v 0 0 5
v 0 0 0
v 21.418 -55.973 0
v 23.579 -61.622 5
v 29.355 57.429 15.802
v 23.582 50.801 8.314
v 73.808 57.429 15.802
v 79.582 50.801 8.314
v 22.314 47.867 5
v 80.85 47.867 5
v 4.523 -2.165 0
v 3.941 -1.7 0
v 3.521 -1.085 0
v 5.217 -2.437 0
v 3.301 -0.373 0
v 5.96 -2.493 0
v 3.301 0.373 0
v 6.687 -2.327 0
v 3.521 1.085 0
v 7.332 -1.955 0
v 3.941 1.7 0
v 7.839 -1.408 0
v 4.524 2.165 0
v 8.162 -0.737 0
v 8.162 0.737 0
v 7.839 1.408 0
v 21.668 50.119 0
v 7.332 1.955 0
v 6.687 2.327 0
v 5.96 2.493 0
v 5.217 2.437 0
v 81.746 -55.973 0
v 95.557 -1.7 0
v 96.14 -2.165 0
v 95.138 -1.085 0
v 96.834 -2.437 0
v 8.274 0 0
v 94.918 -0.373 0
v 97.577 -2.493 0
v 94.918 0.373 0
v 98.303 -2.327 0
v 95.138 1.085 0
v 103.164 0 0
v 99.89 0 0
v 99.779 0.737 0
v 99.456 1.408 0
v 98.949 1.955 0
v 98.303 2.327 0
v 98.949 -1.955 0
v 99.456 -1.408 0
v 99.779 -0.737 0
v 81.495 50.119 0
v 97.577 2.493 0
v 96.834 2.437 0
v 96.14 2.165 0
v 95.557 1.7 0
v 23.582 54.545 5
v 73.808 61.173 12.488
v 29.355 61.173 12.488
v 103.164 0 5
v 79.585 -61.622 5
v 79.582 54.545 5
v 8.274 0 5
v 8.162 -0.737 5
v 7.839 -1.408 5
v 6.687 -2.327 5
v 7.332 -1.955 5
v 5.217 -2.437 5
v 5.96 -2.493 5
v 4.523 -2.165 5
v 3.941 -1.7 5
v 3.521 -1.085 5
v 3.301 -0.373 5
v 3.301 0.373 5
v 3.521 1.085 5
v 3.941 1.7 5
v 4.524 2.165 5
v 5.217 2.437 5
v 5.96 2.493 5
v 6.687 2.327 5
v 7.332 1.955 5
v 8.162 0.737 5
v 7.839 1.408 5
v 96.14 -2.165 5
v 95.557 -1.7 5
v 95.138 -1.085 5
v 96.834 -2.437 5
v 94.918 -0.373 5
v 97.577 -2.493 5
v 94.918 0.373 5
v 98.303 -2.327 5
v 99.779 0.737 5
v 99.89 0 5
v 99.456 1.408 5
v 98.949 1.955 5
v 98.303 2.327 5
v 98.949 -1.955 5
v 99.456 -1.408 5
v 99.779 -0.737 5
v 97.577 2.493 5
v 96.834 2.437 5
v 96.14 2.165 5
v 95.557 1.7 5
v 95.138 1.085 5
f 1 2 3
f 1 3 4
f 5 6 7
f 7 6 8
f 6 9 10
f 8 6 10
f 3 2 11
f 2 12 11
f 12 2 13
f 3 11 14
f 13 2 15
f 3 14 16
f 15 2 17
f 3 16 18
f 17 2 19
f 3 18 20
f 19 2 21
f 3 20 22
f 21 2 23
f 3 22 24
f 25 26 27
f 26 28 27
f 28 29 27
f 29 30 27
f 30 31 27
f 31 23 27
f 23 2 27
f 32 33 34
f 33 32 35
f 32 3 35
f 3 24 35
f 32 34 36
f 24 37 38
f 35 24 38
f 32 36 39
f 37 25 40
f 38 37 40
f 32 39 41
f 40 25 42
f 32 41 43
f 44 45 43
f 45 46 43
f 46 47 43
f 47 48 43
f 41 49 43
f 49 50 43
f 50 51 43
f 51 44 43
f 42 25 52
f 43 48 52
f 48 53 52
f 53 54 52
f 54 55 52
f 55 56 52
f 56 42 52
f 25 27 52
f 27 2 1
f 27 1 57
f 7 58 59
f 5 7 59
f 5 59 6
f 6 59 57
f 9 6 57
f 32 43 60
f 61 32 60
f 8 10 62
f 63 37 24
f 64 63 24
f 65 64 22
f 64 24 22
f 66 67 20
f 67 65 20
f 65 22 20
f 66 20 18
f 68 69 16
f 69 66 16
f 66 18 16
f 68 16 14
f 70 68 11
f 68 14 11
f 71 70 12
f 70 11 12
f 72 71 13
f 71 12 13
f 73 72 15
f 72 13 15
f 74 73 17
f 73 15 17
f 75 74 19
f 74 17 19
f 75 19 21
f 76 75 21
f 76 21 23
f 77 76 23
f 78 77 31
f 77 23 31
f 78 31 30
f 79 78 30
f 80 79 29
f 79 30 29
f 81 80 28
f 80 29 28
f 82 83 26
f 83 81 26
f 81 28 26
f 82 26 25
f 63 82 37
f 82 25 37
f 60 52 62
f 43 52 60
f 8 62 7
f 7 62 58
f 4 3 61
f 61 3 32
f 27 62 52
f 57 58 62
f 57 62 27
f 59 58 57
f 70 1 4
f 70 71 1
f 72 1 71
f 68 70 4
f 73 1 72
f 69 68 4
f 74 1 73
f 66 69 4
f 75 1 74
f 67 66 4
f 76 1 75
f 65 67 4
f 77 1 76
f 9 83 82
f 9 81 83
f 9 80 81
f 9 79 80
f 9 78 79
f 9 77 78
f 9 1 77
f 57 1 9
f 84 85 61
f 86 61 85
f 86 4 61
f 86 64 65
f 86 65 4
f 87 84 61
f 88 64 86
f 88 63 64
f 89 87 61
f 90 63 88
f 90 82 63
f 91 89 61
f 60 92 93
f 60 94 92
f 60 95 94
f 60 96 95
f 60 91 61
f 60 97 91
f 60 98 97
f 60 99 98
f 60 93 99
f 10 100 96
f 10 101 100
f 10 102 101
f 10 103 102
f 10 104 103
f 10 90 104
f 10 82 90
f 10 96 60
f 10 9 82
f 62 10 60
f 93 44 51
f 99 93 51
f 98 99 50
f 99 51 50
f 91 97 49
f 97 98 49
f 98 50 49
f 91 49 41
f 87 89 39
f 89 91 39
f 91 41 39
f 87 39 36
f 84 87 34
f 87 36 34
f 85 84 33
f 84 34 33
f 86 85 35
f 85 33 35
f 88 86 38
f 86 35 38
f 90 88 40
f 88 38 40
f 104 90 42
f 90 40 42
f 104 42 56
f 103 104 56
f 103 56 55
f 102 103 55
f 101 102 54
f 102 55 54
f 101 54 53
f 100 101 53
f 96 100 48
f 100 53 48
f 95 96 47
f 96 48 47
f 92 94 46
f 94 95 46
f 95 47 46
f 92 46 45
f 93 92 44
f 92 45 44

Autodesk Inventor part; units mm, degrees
ref_plane "YZ Plane" through (0, 0, 0) normal (1, 0, 0) x (0, 1, 0)
ref_plane "XZ Plane" through (0, 0, 0) normal (0, 1, 0) x (-1, 0, 0)
sketch "Sketch1" plane through (0, 0, 0) normal (0, 0, 1) x (1, 0, 0)
  line L0 (0, 0) -> (23.5818, 54.5446)
  line L1 (0, 0) -> (23.5818, -61.6289)
  line L2 (23.5818, -61.6289) -> (79.5818, -61.6289)
  line L3 (23.5818, 54.5446) -> (79.5818, 54.5446)
  line L4 (79.5818, 54.5446) -> (103.1637, 0)
  line L5 (103.1637, 0) -> (79.5818, -61.6289)
  circle A0 centre (5.7735, 0) radius 2.5
  circle A1 centre (97.3901, 0) radius 2.5
  dimension "d0" = 135.68
  dimension "d1" = 65.9865
  dimension "d2" = 59.424
  dimension "d3" = 56
  dimension "d4" = 65.9865
  dimension "d5" = 59.424
  dimension "d6" = 5
  dimension "d7" = 5
  dimension "d8" = 5.7735
  dimension "d9" = 5.7735
extrude "Extrusion1" add sketch "Sketch1" along normal blind 5
ref_plane "Work Plane2" through (23.5818, 54.5446, 5) normal (0, 0.7488, -0.6628) x (-1, 0, 0)
sketch "Sketch3" plane through (23.5818, 54.5446, 5) normal (0, 0.7488, -0.6628) x (-1, 0, 0)
  ellipse E0 centre (-73.8083, -39.894) end of major axis (-71.3083, -39.894) minor radius 1.6569 projected
  ellipse E1 centre (17.8083, -39.894) end of major axis (20.3083, -39.894) minor radius 1.6569 projected
  line L0 (23.5818, -39.894) -> (0, -3.7442) projected
  line L1 (0, -3.7442) -> (-56, -3.7442) projected
  line L2 (-56, -3.7442) -> (-79.5818, -39.894) projected
  line L3 (-79.5818, -39.894) -> (-56, -80.7389) projected
  line L4 (-56, -80.7389) -> (0, -80.7389) projected
  line L5 (0, -80.7389) -> (23.5818, -39.894) projected
  line L6 (-56, -3.7442) -> (-79.5818, -39.894) projected
  line L7 (-56, -3.7442) -> (-56, 0) projected
  line L8 (-79.5818, -36.1498) -> (-56, 0) projected
  line L9 (-79.5818, -39.894) -> (-79.5818, -36.1498) projected
  line L10 (0, -3.7442) -> (-56, -3.7442) projected
  line L11 (0, -3.7442) -> (0, 0) projected
  line L12 (-56, 0) -> (0, 0) projected
  line L13 (-56, -3.7442) -> (-56, 0) projected
  line L14 (0, 0) -> (23.5818, -36.1498) projected
  line L15 (23.5818, -39.894) -> (0, -3.7442) projected
  line L16 (23.5818, -39.894) -> (23.5818, -36.1498) projected
  line L17 (0, 0) -> (23.5818, -36.1498) projected
  line L18 (0, -3.7442) -> (0, 0) projected
extrude "Extrusion2" cut sketch "Sketch3" along normal through all contours E0 | E1 | L5 L4 L3 L2 L1 L0 | L0 L11 L14 L16 | L1 L7 L12 L11 | L2 L9 L8 L7
sketch "Sketch4" plane through (23.5818, 54.5446, 5) normal (0, 0.7488, -0.6628) x (1, 0, 0)
  line L0 (56, 0) -> (0, 0) projected
  line L1 (56, 0) -> (50.2265, -10)
  line L2 (50.2265, -10) -> (5.7735, -10)
  line L3 (5.7735, -10) -> (0, 0)
  line L4 (57.9132, 6.677) -> (56, 0) projected
  line L5 (79.5818, 36.1498) -> (56, 0) projected
  line L6 (79.5818, 39.894) -> (79.5818, 36.1498) projected
  line L7 (57.9132, 6.677) -> (79.5818, 39.894) projected
  line L8 (0, 0) -> (-1.9132, 6.677) projected
  line L9 (56, 0) -> (0, 0) projected
  line L10 (57.9132, 6.677) -> (56, 0) projected
  line L11 (-1.9132, 6.677) -> (57.9132, 6.677) projected
  line L12 (0, 0) -> (-1.9132, 6.677) projected
  line L13 (-23.5818, 39.894) -> (-1.9132, 6.677) projected
  line L14 (-23.5818, 39.894) -> (-23.5818, 36.1498) projected
  line L15 (0, 0) -> (-23.5818, 36.1498) projected
  dimension "d16" = 60
  dimension "d17" = 60
  dimension "d18" = 10
extrude "Extrusion3" add sketch "Sketch4" against normal blind 5 contours L1 L2 L3 L0 | L0 L8 L11 L4
sketch "Sketch5" plane through (23.5818, 54.5446, 5) normal (0, 0.7488, -0.6628) x (1, 0, 0)
  line L0 (0, 76.9948) -> (56, 76.9948) projected
  line L1 (56, 76.9948) -> (67.4601, 76.9948)
  line L2 (67.4601, 76.9948) -> (67.4601, 91.9948)
  line L3 (67.4601, 91.9948) -> (-7.5399, 91.9948)
  line L4 (0, 76.9948) -> (-7.5399, 76.9948)
  line L5 (-7.5399, 76.9948) -> (-7.5399, 91.9948)
  point P0 (-23.5818, 39.894)
  dimension "d21" = 15
  dimension "d22" = 75
extrude "Extrusion4" cut sketch "Sketch5" against normal through all
equation "\"d4\" = d1"
equation "\"d5\" = d2"
properties part number "TARM08" material "ABS Plastic"
